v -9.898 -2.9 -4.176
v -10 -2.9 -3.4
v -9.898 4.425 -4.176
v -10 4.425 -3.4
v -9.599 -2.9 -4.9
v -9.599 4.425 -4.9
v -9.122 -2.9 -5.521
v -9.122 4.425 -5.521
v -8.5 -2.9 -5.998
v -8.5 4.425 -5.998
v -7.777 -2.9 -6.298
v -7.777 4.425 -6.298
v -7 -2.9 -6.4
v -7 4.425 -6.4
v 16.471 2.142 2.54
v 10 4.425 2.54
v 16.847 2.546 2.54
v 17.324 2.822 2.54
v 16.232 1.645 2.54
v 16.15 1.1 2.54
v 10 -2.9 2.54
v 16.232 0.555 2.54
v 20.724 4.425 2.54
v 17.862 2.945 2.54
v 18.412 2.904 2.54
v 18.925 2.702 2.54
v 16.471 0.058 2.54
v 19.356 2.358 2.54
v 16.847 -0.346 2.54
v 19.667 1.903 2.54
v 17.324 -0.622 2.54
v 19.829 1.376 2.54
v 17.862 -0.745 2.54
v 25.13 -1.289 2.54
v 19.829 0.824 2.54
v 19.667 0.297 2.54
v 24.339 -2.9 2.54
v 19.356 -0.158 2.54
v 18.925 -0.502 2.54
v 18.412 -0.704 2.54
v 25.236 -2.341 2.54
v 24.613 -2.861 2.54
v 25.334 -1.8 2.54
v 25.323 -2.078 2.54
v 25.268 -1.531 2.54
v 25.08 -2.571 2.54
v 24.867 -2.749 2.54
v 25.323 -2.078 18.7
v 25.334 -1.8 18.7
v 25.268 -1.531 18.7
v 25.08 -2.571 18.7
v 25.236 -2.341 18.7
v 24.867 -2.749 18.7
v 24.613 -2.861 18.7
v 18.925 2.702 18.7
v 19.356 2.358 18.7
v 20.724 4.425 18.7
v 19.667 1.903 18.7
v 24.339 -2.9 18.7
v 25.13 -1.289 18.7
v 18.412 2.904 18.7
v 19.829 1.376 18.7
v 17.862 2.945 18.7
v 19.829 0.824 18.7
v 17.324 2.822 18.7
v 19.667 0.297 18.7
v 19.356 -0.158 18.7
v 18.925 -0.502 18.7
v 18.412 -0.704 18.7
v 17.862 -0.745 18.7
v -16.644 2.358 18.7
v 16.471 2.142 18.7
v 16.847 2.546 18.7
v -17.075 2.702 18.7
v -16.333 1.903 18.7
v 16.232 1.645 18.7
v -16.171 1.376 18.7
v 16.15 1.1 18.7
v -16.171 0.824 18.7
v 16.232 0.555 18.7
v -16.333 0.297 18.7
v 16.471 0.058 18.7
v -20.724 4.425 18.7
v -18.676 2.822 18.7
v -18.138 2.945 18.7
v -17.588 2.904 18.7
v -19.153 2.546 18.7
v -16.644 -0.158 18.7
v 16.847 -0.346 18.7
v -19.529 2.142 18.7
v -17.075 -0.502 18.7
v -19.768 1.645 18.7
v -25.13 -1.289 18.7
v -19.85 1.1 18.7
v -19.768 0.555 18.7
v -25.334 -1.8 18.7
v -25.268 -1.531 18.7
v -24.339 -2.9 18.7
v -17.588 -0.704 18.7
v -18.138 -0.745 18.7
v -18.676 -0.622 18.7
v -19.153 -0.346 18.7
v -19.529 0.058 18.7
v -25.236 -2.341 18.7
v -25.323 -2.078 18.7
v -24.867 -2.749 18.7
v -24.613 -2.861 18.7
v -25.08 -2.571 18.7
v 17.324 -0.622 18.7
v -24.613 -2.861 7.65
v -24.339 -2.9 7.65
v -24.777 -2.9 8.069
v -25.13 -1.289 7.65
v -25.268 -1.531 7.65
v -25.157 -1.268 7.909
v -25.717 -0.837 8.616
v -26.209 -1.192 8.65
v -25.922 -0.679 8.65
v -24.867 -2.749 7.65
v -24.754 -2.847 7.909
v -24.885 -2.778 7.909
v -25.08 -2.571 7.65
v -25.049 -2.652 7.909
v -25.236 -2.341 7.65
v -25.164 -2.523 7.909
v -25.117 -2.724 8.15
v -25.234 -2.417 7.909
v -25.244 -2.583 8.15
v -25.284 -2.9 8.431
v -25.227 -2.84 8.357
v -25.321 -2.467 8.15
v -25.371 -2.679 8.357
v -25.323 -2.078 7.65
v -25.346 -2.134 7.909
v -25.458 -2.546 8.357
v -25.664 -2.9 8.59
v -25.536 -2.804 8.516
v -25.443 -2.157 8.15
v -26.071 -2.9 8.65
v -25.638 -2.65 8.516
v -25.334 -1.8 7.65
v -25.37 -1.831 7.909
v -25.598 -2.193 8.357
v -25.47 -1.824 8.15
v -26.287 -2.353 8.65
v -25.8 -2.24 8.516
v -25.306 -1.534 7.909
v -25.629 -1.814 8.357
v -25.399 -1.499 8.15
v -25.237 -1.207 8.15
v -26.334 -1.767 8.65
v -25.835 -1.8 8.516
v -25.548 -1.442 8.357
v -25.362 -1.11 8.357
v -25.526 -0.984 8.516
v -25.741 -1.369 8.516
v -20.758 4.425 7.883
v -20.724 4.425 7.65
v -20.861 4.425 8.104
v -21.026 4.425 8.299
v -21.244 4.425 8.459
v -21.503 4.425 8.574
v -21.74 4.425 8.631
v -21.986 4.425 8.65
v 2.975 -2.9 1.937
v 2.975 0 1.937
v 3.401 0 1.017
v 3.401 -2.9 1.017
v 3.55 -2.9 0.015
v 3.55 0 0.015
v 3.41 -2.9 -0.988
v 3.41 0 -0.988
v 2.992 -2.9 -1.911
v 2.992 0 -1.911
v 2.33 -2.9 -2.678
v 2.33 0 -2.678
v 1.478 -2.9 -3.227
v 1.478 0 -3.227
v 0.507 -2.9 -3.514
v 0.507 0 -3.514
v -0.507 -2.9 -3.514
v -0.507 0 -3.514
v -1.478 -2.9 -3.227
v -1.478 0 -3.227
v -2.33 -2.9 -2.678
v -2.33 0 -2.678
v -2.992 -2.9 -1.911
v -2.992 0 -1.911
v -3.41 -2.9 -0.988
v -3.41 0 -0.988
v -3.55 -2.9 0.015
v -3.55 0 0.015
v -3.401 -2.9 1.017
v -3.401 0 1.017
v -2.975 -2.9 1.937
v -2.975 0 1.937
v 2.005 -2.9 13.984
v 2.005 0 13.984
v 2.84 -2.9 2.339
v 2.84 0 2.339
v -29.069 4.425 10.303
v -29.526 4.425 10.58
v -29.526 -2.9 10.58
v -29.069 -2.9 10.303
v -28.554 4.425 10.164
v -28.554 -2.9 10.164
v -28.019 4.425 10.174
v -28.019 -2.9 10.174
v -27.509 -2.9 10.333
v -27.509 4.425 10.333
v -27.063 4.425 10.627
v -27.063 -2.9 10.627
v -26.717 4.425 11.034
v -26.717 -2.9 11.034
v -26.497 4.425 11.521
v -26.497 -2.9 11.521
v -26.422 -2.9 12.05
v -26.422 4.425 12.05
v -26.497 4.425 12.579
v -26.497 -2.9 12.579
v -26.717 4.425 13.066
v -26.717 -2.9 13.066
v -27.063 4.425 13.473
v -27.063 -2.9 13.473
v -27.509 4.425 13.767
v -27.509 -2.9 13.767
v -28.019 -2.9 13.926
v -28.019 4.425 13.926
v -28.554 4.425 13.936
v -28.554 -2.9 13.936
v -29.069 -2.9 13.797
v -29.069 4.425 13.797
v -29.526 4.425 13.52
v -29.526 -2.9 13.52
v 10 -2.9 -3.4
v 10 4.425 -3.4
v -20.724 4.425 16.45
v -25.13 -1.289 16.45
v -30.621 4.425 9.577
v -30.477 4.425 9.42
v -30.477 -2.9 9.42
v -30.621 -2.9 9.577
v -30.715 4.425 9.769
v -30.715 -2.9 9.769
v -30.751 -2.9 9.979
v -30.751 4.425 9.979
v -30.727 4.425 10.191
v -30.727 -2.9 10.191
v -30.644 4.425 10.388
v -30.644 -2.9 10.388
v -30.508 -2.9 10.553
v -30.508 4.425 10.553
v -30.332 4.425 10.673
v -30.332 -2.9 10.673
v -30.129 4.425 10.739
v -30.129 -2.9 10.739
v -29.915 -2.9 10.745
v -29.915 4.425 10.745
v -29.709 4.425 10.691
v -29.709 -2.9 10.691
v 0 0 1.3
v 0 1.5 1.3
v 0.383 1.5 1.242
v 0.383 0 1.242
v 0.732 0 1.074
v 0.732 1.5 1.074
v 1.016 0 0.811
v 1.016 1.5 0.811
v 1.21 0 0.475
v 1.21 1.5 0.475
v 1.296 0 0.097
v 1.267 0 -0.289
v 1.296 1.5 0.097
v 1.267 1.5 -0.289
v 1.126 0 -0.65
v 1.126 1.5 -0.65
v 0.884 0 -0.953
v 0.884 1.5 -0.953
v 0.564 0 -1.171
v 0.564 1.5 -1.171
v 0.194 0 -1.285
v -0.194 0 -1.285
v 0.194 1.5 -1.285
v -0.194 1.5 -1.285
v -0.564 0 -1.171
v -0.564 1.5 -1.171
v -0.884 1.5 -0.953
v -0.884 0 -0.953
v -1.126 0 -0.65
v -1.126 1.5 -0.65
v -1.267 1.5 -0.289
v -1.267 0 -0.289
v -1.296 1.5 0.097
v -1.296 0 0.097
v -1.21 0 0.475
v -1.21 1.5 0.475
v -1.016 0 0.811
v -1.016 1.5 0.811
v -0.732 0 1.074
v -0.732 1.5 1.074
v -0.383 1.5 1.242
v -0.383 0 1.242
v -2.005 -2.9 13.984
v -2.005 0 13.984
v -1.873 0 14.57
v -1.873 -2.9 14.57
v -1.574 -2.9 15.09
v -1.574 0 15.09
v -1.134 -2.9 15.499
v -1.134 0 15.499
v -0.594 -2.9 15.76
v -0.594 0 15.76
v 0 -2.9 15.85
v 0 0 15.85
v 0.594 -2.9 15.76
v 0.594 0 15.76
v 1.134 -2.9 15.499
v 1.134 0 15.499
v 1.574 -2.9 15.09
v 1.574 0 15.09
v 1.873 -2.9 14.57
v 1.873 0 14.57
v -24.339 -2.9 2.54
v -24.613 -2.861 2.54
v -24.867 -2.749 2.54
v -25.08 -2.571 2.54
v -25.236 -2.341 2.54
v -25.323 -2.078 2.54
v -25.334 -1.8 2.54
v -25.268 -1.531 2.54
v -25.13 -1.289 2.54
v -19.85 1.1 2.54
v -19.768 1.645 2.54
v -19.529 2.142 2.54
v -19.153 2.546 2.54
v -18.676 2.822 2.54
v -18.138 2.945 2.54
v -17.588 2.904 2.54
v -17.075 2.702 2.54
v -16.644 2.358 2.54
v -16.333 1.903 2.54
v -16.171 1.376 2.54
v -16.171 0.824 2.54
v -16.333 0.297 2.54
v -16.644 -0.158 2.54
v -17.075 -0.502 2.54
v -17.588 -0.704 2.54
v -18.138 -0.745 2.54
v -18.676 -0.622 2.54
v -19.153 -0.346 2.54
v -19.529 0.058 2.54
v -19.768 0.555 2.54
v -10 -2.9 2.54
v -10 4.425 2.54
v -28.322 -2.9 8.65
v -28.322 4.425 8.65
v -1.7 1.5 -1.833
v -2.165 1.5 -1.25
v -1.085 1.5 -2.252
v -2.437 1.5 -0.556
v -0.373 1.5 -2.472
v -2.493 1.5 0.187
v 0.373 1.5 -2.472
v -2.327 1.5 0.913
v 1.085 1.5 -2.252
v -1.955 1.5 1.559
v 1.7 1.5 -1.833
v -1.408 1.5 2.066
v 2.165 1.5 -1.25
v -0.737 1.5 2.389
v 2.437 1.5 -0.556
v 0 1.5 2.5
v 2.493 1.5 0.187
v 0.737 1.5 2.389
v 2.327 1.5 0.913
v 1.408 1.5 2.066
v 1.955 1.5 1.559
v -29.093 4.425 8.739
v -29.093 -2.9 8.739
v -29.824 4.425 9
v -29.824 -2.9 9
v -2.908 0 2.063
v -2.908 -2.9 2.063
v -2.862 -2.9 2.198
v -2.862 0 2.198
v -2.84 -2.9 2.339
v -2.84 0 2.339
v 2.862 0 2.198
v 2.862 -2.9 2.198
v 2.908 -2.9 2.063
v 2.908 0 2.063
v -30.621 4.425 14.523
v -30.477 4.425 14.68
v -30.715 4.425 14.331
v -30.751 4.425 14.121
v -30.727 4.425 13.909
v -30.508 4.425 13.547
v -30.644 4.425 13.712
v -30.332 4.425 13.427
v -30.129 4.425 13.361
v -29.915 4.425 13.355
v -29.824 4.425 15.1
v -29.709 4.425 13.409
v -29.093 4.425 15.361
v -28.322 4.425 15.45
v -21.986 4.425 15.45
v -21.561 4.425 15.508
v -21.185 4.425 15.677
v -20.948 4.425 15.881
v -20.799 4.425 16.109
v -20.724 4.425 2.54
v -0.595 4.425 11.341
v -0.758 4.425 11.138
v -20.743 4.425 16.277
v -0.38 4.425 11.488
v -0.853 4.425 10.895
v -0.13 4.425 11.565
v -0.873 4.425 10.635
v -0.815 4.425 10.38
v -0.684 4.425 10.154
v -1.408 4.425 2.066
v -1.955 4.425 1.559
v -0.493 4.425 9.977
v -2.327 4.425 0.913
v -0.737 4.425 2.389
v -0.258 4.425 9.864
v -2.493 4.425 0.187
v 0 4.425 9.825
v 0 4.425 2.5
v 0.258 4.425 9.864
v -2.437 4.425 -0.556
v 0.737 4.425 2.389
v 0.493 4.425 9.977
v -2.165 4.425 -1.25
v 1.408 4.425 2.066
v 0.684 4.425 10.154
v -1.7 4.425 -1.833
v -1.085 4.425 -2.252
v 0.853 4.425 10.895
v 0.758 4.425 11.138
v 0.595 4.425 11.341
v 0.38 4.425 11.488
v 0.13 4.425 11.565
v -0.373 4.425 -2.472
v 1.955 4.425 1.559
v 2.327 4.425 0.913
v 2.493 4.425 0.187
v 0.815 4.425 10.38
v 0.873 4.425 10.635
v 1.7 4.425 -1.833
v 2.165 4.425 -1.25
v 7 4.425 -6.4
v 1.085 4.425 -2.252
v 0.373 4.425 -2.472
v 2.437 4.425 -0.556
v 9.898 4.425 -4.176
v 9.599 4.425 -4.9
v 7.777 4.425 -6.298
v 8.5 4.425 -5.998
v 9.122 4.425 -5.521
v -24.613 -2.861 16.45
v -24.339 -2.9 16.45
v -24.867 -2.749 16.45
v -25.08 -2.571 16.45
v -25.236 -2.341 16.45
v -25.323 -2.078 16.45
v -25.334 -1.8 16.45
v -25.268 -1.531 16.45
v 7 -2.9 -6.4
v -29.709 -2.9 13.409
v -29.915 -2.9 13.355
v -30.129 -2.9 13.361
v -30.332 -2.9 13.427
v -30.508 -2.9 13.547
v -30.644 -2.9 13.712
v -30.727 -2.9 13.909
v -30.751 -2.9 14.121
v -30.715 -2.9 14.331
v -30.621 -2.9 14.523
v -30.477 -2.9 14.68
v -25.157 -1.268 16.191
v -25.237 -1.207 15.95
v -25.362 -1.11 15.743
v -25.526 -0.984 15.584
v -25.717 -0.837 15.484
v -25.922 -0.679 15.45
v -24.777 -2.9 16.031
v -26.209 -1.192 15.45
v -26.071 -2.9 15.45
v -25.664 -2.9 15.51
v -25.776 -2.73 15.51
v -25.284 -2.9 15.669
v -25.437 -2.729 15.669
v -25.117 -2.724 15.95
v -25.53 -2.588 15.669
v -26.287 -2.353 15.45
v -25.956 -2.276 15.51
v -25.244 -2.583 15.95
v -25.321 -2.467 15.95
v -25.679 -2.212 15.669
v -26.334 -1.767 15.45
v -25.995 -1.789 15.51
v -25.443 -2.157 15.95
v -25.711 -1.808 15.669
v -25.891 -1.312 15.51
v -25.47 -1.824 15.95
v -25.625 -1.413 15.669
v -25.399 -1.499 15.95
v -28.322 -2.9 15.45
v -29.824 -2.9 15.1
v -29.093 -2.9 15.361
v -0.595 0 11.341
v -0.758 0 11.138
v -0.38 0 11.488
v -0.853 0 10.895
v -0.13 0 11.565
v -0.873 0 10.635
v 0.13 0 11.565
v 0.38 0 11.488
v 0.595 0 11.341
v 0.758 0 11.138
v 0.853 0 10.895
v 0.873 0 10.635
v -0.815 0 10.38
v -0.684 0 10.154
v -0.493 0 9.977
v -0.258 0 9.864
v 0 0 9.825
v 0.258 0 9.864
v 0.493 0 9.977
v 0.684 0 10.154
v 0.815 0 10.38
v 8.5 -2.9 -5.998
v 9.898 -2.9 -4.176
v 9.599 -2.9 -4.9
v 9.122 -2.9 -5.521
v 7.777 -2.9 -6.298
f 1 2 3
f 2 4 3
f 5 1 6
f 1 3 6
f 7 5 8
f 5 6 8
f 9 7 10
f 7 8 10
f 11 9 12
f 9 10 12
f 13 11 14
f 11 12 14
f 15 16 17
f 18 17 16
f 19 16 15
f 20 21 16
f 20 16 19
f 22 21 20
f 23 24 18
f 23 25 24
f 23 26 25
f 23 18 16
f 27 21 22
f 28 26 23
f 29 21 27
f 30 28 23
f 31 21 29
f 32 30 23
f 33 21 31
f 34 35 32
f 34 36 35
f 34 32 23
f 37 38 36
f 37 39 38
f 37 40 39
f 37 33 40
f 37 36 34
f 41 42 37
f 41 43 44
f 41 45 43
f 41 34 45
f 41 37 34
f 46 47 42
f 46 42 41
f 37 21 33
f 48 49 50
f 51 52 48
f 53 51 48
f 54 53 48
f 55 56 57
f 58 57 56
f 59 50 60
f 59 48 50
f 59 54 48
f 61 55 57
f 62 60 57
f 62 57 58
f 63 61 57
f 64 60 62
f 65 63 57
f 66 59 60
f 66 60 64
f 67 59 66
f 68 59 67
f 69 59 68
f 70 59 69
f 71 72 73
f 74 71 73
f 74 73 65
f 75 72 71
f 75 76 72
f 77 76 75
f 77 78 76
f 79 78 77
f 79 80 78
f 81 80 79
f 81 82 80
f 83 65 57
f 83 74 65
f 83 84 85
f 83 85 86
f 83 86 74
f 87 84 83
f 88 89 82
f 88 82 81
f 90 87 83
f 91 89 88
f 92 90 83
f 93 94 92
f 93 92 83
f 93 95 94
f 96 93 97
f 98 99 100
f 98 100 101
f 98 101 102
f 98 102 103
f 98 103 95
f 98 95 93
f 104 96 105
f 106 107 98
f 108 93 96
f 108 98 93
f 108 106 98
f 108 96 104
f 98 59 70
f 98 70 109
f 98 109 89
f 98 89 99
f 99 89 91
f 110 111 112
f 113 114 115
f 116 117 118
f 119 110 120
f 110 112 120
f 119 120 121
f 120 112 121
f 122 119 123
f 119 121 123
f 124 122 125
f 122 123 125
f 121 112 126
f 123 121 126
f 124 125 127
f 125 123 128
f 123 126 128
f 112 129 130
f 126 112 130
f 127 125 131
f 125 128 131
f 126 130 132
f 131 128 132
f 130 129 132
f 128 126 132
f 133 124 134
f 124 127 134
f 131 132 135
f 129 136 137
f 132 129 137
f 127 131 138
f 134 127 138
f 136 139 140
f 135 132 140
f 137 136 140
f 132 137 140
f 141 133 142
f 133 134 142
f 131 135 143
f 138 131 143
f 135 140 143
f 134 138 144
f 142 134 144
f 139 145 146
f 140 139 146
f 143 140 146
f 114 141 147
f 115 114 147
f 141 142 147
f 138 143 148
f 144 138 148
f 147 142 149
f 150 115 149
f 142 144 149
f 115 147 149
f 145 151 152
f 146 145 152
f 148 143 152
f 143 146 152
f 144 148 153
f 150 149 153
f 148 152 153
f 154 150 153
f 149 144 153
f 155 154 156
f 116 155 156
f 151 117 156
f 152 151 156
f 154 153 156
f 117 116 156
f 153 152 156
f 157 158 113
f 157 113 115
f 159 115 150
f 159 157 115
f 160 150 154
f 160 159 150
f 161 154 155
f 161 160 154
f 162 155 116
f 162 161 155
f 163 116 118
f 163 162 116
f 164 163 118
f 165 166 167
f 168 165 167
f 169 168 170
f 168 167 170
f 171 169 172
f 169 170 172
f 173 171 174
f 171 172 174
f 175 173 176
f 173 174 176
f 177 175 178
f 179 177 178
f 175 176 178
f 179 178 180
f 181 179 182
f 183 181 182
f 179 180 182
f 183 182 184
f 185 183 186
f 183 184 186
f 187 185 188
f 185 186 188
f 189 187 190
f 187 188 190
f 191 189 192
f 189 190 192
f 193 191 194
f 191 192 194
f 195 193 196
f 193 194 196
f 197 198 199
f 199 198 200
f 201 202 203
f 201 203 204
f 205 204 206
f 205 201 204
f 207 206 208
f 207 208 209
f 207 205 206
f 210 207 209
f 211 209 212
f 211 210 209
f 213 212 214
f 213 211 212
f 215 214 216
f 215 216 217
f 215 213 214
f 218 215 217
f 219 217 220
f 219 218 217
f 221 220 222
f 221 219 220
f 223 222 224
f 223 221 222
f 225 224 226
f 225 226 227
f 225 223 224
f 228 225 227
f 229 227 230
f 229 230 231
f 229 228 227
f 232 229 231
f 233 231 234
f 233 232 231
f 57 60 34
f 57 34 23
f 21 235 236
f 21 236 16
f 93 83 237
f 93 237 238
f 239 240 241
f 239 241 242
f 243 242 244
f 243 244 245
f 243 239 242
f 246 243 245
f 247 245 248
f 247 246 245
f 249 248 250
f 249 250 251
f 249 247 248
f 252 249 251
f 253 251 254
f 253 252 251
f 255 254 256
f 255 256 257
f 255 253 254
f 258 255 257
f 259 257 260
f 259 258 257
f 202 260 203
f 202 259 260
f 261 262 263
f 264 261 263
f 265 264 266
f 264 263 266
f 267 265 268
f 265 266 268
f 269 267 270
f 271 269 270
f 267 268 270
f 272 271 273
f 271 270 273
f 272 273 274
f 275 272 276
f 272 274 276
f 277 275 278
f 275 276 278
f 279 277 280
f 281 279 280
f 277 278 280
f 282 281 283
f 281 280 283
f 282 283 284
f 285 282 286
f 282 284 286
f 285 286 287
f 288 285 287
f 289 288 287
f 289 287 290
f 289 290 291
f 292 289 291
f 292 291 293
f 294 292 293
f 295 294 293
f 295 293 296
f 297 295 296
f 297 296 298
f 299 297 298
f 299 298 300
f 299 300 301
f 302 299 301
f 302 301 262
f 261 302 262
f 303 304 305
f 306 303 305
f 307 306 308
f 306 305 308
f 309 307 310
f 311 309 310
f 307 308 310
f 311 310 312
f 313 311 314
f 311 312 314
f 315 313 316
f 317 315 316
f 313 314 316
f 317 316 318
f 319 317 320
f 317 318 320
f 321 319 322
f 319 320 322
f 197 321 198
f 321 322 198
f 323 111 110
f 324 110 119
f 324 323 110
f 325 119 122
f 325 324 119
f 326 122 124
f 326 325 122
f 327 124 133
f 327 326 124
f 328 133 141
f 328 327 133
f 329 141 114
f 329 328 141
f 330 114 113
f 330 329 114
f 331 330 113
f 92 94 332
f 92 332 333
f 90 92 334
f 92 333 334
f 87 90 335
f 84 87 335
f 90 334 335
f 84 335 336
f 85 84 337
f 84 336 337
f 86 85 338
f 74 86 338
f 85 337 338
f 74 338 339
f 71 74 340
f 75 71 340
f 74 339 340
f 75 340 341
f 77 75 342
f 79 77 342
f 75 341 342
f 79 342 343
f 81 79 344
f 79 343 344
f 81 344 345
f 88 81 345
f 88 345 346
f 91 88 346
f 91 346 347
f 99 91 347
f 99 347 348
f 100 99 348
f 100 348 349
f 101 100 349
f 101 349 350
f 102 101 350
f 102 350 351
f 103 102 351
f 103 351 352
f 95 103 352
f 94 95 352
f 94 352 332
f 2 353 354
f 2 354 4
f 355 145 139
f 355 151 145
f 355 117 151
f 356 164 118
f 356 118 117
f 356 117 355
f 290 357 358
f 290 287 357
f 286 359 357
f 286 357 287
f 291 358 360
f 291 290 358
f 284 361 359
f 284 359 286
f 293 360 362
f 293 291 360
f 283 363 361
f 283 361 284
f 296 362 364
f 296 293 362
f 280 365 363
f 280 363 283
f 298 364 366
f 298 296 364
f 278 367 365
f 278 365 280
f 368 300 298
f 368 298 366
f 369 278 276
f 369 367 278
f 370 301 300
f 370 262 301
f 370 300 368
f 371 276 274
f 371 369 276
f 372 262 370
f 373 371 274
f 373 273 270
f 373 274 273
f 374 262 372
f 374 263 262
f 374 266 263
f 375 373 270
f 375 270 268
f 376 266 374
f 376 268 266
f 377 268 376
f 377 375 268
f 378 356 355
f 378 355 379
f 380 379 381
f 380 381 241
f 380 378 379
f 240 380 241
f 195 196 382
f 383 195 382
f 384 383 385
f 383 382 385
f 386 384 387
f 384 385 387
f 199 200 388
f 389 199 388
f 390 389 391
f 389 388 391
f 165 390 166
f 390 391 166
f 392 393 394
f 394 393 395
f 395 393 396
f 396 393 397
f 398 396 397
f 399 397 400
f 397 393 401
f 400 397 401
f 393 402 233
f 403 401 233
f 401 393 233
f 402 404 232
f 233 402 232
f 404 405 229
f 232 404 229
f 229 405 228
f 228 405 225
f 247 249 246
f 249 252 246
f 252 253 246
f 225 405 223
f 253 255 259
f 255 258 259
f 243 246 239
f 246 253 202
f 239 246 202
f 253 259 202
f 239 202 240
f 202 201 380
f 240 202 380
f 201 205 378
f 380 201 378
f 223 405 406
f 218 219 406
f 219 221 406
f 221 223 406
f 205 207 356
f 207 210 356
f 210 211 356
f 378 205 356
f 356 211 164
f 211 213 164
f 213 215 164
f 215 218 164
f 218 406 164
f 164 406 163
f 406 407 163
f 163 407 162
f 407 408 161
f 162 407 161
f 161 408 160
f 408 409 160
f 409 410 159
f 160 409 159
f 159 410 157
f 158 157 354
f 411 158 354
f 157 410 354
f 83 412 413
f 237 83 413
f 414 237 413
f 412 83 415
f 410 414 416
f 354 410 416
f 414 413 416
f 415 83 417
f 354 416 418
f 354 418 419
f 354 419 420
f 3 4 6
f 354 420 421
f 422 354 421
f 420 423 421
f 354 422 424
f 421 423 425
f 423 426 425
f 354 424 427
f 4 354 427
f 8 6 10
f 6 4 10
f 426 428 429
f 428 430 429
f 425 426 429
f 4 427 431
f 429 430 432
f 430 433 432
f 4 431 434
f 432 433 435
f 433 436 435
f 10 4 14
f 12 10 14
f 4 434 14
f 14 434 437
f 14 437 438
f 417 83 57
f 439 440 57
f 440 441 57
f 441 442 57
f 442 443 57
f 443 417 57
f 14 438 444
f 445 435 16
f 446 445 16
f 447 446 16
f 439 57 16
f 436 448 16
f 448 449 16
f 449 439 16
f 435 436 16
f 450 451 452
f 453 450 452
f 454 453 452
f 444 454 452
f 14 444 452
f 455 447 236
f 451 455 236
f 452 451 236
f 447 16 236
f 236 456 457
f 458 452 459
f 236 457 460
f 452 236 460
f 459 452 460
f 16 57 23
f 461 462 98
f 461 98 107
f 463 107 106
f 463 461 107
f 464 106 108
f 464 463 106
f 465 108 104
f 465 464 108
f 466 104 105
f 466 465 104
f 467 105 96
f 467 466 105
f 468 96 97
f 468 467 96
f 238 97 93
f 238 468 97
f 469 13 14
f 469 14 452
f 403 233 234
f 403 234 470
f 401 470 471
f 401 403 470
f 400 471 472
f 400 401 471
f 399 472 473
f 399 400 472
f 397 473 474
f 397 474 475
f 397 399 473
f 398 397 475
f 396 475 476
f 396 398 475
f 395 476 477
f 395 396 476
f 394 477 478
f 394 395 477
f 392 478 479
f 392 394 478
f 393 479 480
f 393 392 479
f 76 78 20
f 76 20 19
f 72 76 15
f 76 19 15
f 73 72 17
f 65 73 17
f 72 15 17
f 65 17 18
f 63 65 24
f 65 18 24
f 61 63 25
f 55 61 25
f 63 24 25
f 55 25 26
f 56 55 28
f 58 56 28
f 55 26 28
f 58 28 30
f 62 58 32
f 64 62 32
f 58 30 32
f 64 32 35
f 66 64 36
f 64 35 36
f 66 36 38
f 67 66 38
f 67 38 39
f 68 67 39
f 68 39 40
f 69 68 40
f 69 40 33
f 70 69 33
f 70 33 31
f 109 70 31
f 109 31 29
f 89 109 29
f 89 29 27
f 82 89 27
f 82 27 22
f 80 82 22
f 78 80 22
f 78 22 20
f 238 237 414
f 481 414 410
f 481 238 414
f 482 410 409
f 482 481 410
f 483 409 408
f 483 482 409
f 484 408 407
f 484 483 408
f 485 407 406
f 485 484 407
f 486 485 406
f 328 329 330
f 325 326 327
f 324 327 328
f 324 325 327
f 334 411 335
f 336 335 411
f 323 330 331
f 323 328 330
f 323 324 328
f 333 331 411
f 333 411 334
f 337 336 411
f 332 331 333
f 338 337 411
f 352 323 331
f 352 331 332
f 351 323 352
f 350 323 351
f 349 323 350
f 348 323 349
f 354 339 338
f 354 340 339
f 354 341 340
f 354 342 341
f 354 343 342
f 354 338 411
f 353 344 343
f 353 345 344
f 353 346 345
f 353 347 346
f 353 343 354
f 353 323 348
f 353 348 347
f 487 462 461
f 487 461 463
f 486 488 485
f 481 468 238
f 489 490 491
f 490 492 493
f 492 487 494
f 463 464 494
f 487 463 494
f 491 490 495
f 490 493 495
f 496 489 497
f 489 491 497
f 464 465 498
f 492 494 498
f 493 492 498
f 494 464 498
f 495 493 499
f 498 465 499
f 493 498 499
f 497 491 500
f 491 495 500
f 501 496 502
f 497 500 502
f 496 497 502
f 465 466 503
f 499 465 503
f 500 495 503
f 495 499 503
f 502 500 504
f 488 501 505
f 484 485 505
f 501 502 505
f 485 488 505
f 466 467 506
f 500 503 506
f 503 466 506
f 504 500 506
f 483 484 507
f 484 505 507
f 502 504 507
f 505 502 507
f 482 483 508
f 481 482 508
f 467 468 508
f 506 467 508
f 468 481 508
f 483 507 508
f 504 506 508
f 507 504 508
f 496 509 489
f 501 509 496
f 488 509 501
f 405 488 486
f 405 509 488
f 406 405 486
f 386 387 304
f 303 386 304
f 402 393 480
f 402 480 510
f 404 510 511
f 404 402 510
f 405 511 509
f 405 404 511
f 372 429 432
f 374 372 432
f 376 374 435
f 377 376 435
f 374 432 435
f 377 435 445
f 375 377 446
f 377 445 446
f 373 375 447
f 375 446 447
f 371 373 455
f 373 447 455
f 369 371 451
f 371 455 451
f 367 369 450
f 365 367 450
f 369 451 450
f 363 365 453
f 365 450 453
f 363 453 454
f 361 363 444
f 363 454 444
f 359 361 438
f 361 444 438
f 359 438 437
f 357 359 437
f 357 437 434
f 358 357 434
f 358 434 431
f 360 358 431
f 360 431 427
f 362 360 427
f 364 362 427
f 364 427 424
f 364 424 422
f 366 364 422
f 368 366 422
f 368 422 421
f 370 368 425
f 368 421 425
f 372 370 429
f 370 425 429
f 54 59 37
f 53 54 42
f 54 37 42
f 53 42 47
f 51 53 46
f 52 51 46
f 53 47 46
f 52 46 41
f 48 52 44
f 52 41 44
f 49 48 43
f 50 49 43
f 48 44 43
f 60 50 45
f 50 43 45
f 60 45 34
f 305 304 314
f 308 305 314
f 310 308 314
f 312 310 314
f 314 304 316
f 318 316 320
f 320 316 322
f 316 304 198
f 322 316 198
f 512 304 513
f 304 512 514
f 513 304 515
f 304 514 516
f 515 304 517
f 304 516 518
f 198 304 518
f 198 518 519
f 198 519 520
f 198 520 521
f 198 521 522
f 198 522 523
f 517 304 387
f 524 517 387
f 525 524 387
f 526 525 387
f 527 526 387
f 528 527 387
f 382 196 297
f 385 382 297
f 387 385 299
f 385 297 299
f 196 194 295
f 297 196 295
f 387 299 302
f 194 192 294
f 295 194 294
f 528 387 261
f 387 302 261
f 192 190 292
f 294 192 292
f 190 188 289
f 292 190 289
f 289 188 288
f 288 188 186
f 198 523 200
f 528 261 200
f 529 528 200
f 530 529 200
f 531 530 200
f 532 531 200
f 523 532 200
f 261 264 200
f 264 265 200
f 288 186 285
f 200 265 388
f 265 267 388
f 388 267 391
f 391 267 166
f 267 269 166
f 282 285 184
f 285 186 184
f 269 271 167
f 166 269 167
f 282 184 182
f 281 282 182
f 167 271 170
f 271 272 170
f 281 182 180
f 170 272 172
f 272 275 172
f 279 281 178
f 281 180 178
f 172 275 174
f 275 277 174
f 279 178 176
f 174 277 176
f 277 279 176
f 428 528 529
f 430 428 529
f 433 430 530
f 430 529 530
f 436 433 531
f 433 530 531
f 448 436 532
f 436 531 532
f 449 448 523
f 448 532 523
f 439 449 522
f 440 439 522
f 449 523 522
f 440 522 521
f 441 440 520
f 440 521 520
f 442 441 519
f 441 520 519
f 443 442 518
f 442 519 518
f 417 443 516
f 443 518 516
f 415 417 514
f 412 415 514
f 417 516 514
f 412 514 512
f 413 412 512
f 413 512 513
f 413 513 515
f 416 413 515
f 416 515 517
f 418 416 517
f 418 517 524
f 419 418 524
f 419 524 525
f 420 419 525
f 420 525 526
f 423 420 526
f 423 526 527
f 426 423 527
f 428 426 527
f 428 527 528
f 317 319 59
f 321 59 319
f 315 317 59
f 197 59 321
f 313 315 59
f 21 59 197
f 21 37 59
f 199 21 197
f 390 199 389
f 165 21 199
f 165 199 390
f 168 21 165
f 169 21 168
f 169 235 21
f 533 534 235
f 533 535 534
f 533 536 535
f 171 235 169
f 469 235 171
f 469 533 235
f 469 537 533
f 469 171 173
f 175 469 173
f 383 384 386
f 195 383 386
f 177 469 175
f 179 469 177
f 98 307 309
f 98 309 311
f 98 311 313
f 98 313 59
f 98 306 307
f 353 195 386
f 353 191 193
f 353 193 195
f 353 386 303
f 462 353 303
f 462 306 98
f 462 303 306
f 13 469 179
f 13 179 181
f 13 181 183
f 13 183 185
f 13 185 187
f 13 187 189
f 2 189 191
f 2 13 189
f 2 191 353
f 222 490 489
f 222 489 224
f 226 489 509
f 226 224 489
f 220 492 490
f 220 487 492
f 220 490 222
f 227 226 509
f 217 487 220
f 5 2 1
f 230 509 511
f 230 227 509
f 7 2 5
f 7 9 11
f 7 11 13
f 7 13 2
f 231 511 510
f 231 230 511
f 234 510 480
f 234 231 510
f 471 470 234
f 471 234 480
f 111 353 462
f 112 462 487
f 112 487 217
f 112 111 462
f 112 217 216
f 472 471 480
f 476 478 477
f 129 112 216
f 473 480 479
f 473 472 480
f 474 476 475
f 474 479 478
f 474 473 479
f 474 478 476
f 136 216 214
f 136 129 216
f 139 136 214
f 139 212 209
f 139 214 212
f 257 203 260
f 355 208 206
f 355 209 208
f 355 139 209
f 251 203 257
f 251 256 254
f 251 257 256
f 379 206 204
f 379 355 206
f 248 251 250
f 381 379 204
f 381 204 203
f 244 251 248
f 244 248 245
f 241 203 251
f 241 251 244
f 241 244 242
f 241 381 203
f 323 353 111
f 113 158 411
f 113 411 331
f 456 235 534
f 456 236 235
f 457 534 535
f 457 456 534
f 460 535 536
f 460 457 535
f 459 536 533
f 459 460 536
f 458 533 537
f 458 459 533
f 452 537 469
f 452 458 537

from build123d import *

# Parameters (mm, degrees)
BOSS_EXTRUDE1_DEPTH      = 4.425
BOSS_EXTRUDE1_DEPTH_BACK = 2.9
CUT_EXTRUDE1_DEPTH       = 34.079090828
SKETCH6_R                = 1.3
CUT_EXTRUDE2_DEPTH       = 34.590195742
SKETCH7_R                = 2.5
CUT_EXTRUDE3_DEPTH       = 2.925
SKETCH8_R                = 0.875
CUT_EXTRUDE4_DEPTH       = 34.079090828
SKETCH9_R                = 1.85
CUT_EXTRUDE5_DEPTH       = 32.712487288
CUT_EXTRUDE6_DEPTH       = 38.074873567
FILLET1_R                = 1
FILLET2_R                = 3
BOSS_EXTRUDE2_DEPTH      = 7.325
FILLET3_R                = 1


with BuildPart() as part:
    # Sketch4 → Boss-Extrude1 (new, two sides: drawn at the far end of the back side and taken through both)
    with BuildSketch(Plane(origin=(0, 0, 0), x_dir=(1, 0, 0), z_dir=(0, 1, 0)).offset(-BOSS_EXTRUDE1_DEPTH_BACK)):
        Polygon((-26.925, -2.54), (-10.000436291, -2.54), (-10.000436291, 6.4), (10.000436291, 6.4), (10.000436291, -2.54), (26.925, -2.54), (26.925, -18.7), (-26.925, -18.7), align=None)
    extrude(amount=BOSS_EXTRUDE1_DEPTH + BOSS_EXTRUDE1_DEPTH_BACK)

    # Sketch5 → Cut-Extrude1 (cut, through all)
    with BuildSketch(Plane(origin=(0, 0, 0), x_dir=(1, 0, 0), z_dir=(0, 1, 0))):
        with BuildLine():
            Line((2.004851846, -13.98376743), (2.839866559, -2.339399967))
            ThreePointArc((2.839866559, -2.339399967), (2.881992781, -2.129359863), (2.975294921, -1.936522692))
            ThreePointArc((2.975294921, -1.936522692), (0, 3.55), (-2.975294921, -1.936522692))
            ThreePointArc((-2.975294921, -1.936522692), (-2.881992781, -2.129359863), (-2.839866559, -2.339399967))
            Line((-2.839866559, -2.339399967), (-2.004851846, -13.98376743))
            ThreePointArc((-2.004851846, -13.98376743), (0, -15.85), (2.004851846, -13.98376743))
        make_face()
    extrude(amount=-CUT_EXTRUDE1_DEPTH, mode=Mode.SUBTRACT)

    # Sketch6 → Cut-Extrude2 (cut, through all)
    with BuildSketch(Plane(origin=(0, 4.425, 0), x_dir=(1, 0, 0), z_dir=(0, 1, 0))):
        with Locations(Location((0, 0, 0), (0, 0, 270))):
            Circle(SKETCH6_R)
    extrude(amount=-CUT_EXTRUDE2_DEPTH, mode=Mode.SUBTRACT)

    # Sketch7 → Cut-Extrude3 (cut)
    with BuildSketch(Plane(origin=(0, 4.425, 0), x_dir=(1, 0, 0), z_dir=(0, 1, 0))):
        with Locations(Location((0, 0, 0), (0, 0, 270))):
            Circle(SKETCH7_R)
    extrude(amount=-CUT_EXTRUDE3_DEPTH, mode=Mode.SUBTRACT)

    # Sketch8 → Cut-Extrude4 (cut, through all)
    with BuildSketch(Plane.XZ):
        with Locations(Location((0, 10.7, 0), (0, 0, 270))):
            Circle(SKETCH8_R)
    extrude(amount=-CUT_EXTRUDE4_DEPTH, mode=Mode.SUBTRACT)

    # Sketch9 → Cut-Extrude5 (cut, through all)
    with BuildSketch(Plane(origin=(0, 0, 2.54), x_dir=(-1, 0, 0), z_dir=(0, 0, -1))):
        with Locations((18, 1.1)):
            Circle(SKETCH9_R)
        with Locations((-18, 1.1)):
            Circle(SKETCH9_R)
    extrude(amount=-CUT_EXTRUDE5_DEPTH, mode=Mode.SUBTRACT)

    # Sketch11 → Cut-Extrude6 (cut, through all)
    with BuildSketch(Plane.XY.offset(18.7)):
        Polygon((-20.723540873, 4.425), (-26.372623028, -2.9), (-26.925, -2.9), (-26.925, 4.425), align=None)
        Polygon((20.723540873, 4.425), (26.925, 4.425), (26.925, -2.9), (26.372623028, -2.9), align=None)
    extrude(amount=-CUT_EXTRUDE6_DEPTH, mode=Mode.SUBTRACT)

    # Fillet1
    fillet1_edges = [part.edges().sort_by_distance(p)[0] for p in [
        (26.372623028, -2.9, 10.62),
        (-26.372623028, -2.9, 10.62),
    ]]
    fillet(fillet1_edges, radius=FILLET1_R)

    # Fillet2
    fillet2_edges = [part.edges().sort_by_distance(p)[0] for p in [
        (-10.000436291, 0.7625, -6.4),
        (10.000436291, 0.7625, -6.4),
    ]]
    fillet(fillet2_edges, radius=FILLET2_R)

    # Sketch14 → Boss-Extrude2 (add, through all)
    with BuildSketch(Plane(origin=(0, 4.425, 0), x_dir=(1, 0, 0), z_dir=(0, 1, 0))):
        with BuildLine():
            Line((-20.723540873, -8.65), (-28.322297461, -8.65))
            ThreePointArc((-28.322297461, -8.65), (-29.466272656, -8.848231621), (-30.476852522, -9.419811321))
            ThreePointArc((-30.476852522, -9.419811321), (-30.581771703, -10.475269499), (-29.526313525, -10.580188679))
            ThreePointArc((-29.526313525, -10.580188679), (-26.422297461, -12.05), (-29.526313525, -13.519811321))
            ThreePointArc((-29.526313525, -13.519811321), (-30.581771703, -13.624730501), (-30.476852522, -14.680188679))
            ThreePointArc((-30.476852522, -14.680188679), (-29.466272656, -15.251768379), (-28.322297461, -15.45))
            Line((-28.322297461, -15.45), (-20.723540873, -15.45))
            Line((-20.723540873, -15.45), (-20.723540873, -8.65))
        make_face()
    extrude(amount=-BOSS_EXTRUDE2_DEPTH)

    # Fillet3
    # the kernel refuses this fillet: 1 mm, written as the material it adds along each edge
    with BuildSketch(Plane(origin=(-24.338579866, -1.9, 8.65), x_dir=(0.5968522081551058, 0.8023511959362772, 0), z_dir=(-0.8023511959362772, 0.5968522081551058, 0))) as fillet3_piece_1_section:
        with BuildLine():
            CenterArc((1 + FILLET3_R, FILLET3_R), FILLET3_R, 180, 90)
            Line((1, FILLET3_R), (1, 0))
            Line((1, 0), (1 + FILLET3_R, 0))
        make_face()
    fillet3_piece_1 = revolve(axis=Axis((-24.338579866, -1.9, 8.65), (0, 0, -1)), revolution_arc=270.994831495, mode=Mode.PRIVATE)
    fillet3_piece_1 = split(fillet3_piece_1, bisect_by=Plane(origin=(-25.318581696, -2.9, 8.393059432), z_dir=(0, 1, 0)), keep=Keep.TOP, mode=Mode.PRIVATE)
    add(fillet3_piece_1)
    with BuildSketch(Plane(origin=(-24.338579866, -1.9, 15.45), x_dir=(0.5968522081551029, 0.8023511959362795, 0), z_dir=(-0.8023511959362795, 0.5968522081551029, 0))) as fillet3_piece_2_section:
        with BuildLine():
            CenterArc((1 + FILLET3_R, -FILLET3_R), FILLET3_R, 90, 90)
            Line((1 + FILLET3_R, 0), (1, 0))
            Line((1, 0), (1, -FILLET3_R))
        make_face()
    fillet3_piece_2 = revolve(axis=Axis((-24.338579866, -1.9, 15.45), (0, 0, -1)), revolution_arc=270.994831495, mode=Mode.PRIVATE)
    fillet3_piece_2 = split(fillet3_piece_2, bisect_by=Plane(origin=(-25.318581739, -2.9, 15.706940487), z_dir=(0, 1, 0)), keep=Keep.TOP, mode=Mode.PRIVATE)
    add(fillet3_piece_2)
    with BuildSketch(Plane(origin=(-25.130447445, -1.289307166, 15.45), x_dir=(0, 0, 1), z_dir=(0.6106928339923638, 0.7918675788983757, 0))) as fillet3_piece_3_section:
        with BuildLine():
            CenterArc((FILLET3_R, -FILLET3_R), FILLET3_R, 90, 90)
            Line((0, -FILLET3_R), (0, 0))
            Line((0, 0), (FILLET3_R, 0))
        make_face()
    fillet3_piece_3 = extrude(amount=9.716240844, mode=Mode.PRIVATE)
    fillet3_piece_3 = split(fillet3_piece_3, bisect_by=Plane(origin=(-23.152517153, 4.425, 15.675632439), z_dir=(0, -1, 0)), keep=Keep.TOP, mode=Mode.PRIVATE)
    add(fillet3_piece_3)
    with BuildSketch(Plane(origin=(-19.196808788, 6.404668947, 8.65), x_dir=(0, 0, -1), z_dir=(-0.6106928339923638, -0.7918675788983757, 0))) as fillet3_piece_4_section:
        with BuildLine():
            CenterArc((FILLET3_R, -FILLET3_R), FILLET3_R, 90, 90)
            Line((0, -FILLET3_R), (0, 0))
            Line((0, 0), (FILLET3_R, 0))
        make_face()
    fillet3_piece_4 = extrude(amount=9.716240844, mode=Mode.PRIVATE)
    fillet3_piece_4 = split(fillet3_piece_4, bisect_by=Plane(origin=(-23.152517153, 4.425, 8.424367561), z_dir=(0, -1, 0)), keep=Keep.TOP, mode=Mode.PRIVATE)
    add(fillet3_piece_4)


solid = part.part
